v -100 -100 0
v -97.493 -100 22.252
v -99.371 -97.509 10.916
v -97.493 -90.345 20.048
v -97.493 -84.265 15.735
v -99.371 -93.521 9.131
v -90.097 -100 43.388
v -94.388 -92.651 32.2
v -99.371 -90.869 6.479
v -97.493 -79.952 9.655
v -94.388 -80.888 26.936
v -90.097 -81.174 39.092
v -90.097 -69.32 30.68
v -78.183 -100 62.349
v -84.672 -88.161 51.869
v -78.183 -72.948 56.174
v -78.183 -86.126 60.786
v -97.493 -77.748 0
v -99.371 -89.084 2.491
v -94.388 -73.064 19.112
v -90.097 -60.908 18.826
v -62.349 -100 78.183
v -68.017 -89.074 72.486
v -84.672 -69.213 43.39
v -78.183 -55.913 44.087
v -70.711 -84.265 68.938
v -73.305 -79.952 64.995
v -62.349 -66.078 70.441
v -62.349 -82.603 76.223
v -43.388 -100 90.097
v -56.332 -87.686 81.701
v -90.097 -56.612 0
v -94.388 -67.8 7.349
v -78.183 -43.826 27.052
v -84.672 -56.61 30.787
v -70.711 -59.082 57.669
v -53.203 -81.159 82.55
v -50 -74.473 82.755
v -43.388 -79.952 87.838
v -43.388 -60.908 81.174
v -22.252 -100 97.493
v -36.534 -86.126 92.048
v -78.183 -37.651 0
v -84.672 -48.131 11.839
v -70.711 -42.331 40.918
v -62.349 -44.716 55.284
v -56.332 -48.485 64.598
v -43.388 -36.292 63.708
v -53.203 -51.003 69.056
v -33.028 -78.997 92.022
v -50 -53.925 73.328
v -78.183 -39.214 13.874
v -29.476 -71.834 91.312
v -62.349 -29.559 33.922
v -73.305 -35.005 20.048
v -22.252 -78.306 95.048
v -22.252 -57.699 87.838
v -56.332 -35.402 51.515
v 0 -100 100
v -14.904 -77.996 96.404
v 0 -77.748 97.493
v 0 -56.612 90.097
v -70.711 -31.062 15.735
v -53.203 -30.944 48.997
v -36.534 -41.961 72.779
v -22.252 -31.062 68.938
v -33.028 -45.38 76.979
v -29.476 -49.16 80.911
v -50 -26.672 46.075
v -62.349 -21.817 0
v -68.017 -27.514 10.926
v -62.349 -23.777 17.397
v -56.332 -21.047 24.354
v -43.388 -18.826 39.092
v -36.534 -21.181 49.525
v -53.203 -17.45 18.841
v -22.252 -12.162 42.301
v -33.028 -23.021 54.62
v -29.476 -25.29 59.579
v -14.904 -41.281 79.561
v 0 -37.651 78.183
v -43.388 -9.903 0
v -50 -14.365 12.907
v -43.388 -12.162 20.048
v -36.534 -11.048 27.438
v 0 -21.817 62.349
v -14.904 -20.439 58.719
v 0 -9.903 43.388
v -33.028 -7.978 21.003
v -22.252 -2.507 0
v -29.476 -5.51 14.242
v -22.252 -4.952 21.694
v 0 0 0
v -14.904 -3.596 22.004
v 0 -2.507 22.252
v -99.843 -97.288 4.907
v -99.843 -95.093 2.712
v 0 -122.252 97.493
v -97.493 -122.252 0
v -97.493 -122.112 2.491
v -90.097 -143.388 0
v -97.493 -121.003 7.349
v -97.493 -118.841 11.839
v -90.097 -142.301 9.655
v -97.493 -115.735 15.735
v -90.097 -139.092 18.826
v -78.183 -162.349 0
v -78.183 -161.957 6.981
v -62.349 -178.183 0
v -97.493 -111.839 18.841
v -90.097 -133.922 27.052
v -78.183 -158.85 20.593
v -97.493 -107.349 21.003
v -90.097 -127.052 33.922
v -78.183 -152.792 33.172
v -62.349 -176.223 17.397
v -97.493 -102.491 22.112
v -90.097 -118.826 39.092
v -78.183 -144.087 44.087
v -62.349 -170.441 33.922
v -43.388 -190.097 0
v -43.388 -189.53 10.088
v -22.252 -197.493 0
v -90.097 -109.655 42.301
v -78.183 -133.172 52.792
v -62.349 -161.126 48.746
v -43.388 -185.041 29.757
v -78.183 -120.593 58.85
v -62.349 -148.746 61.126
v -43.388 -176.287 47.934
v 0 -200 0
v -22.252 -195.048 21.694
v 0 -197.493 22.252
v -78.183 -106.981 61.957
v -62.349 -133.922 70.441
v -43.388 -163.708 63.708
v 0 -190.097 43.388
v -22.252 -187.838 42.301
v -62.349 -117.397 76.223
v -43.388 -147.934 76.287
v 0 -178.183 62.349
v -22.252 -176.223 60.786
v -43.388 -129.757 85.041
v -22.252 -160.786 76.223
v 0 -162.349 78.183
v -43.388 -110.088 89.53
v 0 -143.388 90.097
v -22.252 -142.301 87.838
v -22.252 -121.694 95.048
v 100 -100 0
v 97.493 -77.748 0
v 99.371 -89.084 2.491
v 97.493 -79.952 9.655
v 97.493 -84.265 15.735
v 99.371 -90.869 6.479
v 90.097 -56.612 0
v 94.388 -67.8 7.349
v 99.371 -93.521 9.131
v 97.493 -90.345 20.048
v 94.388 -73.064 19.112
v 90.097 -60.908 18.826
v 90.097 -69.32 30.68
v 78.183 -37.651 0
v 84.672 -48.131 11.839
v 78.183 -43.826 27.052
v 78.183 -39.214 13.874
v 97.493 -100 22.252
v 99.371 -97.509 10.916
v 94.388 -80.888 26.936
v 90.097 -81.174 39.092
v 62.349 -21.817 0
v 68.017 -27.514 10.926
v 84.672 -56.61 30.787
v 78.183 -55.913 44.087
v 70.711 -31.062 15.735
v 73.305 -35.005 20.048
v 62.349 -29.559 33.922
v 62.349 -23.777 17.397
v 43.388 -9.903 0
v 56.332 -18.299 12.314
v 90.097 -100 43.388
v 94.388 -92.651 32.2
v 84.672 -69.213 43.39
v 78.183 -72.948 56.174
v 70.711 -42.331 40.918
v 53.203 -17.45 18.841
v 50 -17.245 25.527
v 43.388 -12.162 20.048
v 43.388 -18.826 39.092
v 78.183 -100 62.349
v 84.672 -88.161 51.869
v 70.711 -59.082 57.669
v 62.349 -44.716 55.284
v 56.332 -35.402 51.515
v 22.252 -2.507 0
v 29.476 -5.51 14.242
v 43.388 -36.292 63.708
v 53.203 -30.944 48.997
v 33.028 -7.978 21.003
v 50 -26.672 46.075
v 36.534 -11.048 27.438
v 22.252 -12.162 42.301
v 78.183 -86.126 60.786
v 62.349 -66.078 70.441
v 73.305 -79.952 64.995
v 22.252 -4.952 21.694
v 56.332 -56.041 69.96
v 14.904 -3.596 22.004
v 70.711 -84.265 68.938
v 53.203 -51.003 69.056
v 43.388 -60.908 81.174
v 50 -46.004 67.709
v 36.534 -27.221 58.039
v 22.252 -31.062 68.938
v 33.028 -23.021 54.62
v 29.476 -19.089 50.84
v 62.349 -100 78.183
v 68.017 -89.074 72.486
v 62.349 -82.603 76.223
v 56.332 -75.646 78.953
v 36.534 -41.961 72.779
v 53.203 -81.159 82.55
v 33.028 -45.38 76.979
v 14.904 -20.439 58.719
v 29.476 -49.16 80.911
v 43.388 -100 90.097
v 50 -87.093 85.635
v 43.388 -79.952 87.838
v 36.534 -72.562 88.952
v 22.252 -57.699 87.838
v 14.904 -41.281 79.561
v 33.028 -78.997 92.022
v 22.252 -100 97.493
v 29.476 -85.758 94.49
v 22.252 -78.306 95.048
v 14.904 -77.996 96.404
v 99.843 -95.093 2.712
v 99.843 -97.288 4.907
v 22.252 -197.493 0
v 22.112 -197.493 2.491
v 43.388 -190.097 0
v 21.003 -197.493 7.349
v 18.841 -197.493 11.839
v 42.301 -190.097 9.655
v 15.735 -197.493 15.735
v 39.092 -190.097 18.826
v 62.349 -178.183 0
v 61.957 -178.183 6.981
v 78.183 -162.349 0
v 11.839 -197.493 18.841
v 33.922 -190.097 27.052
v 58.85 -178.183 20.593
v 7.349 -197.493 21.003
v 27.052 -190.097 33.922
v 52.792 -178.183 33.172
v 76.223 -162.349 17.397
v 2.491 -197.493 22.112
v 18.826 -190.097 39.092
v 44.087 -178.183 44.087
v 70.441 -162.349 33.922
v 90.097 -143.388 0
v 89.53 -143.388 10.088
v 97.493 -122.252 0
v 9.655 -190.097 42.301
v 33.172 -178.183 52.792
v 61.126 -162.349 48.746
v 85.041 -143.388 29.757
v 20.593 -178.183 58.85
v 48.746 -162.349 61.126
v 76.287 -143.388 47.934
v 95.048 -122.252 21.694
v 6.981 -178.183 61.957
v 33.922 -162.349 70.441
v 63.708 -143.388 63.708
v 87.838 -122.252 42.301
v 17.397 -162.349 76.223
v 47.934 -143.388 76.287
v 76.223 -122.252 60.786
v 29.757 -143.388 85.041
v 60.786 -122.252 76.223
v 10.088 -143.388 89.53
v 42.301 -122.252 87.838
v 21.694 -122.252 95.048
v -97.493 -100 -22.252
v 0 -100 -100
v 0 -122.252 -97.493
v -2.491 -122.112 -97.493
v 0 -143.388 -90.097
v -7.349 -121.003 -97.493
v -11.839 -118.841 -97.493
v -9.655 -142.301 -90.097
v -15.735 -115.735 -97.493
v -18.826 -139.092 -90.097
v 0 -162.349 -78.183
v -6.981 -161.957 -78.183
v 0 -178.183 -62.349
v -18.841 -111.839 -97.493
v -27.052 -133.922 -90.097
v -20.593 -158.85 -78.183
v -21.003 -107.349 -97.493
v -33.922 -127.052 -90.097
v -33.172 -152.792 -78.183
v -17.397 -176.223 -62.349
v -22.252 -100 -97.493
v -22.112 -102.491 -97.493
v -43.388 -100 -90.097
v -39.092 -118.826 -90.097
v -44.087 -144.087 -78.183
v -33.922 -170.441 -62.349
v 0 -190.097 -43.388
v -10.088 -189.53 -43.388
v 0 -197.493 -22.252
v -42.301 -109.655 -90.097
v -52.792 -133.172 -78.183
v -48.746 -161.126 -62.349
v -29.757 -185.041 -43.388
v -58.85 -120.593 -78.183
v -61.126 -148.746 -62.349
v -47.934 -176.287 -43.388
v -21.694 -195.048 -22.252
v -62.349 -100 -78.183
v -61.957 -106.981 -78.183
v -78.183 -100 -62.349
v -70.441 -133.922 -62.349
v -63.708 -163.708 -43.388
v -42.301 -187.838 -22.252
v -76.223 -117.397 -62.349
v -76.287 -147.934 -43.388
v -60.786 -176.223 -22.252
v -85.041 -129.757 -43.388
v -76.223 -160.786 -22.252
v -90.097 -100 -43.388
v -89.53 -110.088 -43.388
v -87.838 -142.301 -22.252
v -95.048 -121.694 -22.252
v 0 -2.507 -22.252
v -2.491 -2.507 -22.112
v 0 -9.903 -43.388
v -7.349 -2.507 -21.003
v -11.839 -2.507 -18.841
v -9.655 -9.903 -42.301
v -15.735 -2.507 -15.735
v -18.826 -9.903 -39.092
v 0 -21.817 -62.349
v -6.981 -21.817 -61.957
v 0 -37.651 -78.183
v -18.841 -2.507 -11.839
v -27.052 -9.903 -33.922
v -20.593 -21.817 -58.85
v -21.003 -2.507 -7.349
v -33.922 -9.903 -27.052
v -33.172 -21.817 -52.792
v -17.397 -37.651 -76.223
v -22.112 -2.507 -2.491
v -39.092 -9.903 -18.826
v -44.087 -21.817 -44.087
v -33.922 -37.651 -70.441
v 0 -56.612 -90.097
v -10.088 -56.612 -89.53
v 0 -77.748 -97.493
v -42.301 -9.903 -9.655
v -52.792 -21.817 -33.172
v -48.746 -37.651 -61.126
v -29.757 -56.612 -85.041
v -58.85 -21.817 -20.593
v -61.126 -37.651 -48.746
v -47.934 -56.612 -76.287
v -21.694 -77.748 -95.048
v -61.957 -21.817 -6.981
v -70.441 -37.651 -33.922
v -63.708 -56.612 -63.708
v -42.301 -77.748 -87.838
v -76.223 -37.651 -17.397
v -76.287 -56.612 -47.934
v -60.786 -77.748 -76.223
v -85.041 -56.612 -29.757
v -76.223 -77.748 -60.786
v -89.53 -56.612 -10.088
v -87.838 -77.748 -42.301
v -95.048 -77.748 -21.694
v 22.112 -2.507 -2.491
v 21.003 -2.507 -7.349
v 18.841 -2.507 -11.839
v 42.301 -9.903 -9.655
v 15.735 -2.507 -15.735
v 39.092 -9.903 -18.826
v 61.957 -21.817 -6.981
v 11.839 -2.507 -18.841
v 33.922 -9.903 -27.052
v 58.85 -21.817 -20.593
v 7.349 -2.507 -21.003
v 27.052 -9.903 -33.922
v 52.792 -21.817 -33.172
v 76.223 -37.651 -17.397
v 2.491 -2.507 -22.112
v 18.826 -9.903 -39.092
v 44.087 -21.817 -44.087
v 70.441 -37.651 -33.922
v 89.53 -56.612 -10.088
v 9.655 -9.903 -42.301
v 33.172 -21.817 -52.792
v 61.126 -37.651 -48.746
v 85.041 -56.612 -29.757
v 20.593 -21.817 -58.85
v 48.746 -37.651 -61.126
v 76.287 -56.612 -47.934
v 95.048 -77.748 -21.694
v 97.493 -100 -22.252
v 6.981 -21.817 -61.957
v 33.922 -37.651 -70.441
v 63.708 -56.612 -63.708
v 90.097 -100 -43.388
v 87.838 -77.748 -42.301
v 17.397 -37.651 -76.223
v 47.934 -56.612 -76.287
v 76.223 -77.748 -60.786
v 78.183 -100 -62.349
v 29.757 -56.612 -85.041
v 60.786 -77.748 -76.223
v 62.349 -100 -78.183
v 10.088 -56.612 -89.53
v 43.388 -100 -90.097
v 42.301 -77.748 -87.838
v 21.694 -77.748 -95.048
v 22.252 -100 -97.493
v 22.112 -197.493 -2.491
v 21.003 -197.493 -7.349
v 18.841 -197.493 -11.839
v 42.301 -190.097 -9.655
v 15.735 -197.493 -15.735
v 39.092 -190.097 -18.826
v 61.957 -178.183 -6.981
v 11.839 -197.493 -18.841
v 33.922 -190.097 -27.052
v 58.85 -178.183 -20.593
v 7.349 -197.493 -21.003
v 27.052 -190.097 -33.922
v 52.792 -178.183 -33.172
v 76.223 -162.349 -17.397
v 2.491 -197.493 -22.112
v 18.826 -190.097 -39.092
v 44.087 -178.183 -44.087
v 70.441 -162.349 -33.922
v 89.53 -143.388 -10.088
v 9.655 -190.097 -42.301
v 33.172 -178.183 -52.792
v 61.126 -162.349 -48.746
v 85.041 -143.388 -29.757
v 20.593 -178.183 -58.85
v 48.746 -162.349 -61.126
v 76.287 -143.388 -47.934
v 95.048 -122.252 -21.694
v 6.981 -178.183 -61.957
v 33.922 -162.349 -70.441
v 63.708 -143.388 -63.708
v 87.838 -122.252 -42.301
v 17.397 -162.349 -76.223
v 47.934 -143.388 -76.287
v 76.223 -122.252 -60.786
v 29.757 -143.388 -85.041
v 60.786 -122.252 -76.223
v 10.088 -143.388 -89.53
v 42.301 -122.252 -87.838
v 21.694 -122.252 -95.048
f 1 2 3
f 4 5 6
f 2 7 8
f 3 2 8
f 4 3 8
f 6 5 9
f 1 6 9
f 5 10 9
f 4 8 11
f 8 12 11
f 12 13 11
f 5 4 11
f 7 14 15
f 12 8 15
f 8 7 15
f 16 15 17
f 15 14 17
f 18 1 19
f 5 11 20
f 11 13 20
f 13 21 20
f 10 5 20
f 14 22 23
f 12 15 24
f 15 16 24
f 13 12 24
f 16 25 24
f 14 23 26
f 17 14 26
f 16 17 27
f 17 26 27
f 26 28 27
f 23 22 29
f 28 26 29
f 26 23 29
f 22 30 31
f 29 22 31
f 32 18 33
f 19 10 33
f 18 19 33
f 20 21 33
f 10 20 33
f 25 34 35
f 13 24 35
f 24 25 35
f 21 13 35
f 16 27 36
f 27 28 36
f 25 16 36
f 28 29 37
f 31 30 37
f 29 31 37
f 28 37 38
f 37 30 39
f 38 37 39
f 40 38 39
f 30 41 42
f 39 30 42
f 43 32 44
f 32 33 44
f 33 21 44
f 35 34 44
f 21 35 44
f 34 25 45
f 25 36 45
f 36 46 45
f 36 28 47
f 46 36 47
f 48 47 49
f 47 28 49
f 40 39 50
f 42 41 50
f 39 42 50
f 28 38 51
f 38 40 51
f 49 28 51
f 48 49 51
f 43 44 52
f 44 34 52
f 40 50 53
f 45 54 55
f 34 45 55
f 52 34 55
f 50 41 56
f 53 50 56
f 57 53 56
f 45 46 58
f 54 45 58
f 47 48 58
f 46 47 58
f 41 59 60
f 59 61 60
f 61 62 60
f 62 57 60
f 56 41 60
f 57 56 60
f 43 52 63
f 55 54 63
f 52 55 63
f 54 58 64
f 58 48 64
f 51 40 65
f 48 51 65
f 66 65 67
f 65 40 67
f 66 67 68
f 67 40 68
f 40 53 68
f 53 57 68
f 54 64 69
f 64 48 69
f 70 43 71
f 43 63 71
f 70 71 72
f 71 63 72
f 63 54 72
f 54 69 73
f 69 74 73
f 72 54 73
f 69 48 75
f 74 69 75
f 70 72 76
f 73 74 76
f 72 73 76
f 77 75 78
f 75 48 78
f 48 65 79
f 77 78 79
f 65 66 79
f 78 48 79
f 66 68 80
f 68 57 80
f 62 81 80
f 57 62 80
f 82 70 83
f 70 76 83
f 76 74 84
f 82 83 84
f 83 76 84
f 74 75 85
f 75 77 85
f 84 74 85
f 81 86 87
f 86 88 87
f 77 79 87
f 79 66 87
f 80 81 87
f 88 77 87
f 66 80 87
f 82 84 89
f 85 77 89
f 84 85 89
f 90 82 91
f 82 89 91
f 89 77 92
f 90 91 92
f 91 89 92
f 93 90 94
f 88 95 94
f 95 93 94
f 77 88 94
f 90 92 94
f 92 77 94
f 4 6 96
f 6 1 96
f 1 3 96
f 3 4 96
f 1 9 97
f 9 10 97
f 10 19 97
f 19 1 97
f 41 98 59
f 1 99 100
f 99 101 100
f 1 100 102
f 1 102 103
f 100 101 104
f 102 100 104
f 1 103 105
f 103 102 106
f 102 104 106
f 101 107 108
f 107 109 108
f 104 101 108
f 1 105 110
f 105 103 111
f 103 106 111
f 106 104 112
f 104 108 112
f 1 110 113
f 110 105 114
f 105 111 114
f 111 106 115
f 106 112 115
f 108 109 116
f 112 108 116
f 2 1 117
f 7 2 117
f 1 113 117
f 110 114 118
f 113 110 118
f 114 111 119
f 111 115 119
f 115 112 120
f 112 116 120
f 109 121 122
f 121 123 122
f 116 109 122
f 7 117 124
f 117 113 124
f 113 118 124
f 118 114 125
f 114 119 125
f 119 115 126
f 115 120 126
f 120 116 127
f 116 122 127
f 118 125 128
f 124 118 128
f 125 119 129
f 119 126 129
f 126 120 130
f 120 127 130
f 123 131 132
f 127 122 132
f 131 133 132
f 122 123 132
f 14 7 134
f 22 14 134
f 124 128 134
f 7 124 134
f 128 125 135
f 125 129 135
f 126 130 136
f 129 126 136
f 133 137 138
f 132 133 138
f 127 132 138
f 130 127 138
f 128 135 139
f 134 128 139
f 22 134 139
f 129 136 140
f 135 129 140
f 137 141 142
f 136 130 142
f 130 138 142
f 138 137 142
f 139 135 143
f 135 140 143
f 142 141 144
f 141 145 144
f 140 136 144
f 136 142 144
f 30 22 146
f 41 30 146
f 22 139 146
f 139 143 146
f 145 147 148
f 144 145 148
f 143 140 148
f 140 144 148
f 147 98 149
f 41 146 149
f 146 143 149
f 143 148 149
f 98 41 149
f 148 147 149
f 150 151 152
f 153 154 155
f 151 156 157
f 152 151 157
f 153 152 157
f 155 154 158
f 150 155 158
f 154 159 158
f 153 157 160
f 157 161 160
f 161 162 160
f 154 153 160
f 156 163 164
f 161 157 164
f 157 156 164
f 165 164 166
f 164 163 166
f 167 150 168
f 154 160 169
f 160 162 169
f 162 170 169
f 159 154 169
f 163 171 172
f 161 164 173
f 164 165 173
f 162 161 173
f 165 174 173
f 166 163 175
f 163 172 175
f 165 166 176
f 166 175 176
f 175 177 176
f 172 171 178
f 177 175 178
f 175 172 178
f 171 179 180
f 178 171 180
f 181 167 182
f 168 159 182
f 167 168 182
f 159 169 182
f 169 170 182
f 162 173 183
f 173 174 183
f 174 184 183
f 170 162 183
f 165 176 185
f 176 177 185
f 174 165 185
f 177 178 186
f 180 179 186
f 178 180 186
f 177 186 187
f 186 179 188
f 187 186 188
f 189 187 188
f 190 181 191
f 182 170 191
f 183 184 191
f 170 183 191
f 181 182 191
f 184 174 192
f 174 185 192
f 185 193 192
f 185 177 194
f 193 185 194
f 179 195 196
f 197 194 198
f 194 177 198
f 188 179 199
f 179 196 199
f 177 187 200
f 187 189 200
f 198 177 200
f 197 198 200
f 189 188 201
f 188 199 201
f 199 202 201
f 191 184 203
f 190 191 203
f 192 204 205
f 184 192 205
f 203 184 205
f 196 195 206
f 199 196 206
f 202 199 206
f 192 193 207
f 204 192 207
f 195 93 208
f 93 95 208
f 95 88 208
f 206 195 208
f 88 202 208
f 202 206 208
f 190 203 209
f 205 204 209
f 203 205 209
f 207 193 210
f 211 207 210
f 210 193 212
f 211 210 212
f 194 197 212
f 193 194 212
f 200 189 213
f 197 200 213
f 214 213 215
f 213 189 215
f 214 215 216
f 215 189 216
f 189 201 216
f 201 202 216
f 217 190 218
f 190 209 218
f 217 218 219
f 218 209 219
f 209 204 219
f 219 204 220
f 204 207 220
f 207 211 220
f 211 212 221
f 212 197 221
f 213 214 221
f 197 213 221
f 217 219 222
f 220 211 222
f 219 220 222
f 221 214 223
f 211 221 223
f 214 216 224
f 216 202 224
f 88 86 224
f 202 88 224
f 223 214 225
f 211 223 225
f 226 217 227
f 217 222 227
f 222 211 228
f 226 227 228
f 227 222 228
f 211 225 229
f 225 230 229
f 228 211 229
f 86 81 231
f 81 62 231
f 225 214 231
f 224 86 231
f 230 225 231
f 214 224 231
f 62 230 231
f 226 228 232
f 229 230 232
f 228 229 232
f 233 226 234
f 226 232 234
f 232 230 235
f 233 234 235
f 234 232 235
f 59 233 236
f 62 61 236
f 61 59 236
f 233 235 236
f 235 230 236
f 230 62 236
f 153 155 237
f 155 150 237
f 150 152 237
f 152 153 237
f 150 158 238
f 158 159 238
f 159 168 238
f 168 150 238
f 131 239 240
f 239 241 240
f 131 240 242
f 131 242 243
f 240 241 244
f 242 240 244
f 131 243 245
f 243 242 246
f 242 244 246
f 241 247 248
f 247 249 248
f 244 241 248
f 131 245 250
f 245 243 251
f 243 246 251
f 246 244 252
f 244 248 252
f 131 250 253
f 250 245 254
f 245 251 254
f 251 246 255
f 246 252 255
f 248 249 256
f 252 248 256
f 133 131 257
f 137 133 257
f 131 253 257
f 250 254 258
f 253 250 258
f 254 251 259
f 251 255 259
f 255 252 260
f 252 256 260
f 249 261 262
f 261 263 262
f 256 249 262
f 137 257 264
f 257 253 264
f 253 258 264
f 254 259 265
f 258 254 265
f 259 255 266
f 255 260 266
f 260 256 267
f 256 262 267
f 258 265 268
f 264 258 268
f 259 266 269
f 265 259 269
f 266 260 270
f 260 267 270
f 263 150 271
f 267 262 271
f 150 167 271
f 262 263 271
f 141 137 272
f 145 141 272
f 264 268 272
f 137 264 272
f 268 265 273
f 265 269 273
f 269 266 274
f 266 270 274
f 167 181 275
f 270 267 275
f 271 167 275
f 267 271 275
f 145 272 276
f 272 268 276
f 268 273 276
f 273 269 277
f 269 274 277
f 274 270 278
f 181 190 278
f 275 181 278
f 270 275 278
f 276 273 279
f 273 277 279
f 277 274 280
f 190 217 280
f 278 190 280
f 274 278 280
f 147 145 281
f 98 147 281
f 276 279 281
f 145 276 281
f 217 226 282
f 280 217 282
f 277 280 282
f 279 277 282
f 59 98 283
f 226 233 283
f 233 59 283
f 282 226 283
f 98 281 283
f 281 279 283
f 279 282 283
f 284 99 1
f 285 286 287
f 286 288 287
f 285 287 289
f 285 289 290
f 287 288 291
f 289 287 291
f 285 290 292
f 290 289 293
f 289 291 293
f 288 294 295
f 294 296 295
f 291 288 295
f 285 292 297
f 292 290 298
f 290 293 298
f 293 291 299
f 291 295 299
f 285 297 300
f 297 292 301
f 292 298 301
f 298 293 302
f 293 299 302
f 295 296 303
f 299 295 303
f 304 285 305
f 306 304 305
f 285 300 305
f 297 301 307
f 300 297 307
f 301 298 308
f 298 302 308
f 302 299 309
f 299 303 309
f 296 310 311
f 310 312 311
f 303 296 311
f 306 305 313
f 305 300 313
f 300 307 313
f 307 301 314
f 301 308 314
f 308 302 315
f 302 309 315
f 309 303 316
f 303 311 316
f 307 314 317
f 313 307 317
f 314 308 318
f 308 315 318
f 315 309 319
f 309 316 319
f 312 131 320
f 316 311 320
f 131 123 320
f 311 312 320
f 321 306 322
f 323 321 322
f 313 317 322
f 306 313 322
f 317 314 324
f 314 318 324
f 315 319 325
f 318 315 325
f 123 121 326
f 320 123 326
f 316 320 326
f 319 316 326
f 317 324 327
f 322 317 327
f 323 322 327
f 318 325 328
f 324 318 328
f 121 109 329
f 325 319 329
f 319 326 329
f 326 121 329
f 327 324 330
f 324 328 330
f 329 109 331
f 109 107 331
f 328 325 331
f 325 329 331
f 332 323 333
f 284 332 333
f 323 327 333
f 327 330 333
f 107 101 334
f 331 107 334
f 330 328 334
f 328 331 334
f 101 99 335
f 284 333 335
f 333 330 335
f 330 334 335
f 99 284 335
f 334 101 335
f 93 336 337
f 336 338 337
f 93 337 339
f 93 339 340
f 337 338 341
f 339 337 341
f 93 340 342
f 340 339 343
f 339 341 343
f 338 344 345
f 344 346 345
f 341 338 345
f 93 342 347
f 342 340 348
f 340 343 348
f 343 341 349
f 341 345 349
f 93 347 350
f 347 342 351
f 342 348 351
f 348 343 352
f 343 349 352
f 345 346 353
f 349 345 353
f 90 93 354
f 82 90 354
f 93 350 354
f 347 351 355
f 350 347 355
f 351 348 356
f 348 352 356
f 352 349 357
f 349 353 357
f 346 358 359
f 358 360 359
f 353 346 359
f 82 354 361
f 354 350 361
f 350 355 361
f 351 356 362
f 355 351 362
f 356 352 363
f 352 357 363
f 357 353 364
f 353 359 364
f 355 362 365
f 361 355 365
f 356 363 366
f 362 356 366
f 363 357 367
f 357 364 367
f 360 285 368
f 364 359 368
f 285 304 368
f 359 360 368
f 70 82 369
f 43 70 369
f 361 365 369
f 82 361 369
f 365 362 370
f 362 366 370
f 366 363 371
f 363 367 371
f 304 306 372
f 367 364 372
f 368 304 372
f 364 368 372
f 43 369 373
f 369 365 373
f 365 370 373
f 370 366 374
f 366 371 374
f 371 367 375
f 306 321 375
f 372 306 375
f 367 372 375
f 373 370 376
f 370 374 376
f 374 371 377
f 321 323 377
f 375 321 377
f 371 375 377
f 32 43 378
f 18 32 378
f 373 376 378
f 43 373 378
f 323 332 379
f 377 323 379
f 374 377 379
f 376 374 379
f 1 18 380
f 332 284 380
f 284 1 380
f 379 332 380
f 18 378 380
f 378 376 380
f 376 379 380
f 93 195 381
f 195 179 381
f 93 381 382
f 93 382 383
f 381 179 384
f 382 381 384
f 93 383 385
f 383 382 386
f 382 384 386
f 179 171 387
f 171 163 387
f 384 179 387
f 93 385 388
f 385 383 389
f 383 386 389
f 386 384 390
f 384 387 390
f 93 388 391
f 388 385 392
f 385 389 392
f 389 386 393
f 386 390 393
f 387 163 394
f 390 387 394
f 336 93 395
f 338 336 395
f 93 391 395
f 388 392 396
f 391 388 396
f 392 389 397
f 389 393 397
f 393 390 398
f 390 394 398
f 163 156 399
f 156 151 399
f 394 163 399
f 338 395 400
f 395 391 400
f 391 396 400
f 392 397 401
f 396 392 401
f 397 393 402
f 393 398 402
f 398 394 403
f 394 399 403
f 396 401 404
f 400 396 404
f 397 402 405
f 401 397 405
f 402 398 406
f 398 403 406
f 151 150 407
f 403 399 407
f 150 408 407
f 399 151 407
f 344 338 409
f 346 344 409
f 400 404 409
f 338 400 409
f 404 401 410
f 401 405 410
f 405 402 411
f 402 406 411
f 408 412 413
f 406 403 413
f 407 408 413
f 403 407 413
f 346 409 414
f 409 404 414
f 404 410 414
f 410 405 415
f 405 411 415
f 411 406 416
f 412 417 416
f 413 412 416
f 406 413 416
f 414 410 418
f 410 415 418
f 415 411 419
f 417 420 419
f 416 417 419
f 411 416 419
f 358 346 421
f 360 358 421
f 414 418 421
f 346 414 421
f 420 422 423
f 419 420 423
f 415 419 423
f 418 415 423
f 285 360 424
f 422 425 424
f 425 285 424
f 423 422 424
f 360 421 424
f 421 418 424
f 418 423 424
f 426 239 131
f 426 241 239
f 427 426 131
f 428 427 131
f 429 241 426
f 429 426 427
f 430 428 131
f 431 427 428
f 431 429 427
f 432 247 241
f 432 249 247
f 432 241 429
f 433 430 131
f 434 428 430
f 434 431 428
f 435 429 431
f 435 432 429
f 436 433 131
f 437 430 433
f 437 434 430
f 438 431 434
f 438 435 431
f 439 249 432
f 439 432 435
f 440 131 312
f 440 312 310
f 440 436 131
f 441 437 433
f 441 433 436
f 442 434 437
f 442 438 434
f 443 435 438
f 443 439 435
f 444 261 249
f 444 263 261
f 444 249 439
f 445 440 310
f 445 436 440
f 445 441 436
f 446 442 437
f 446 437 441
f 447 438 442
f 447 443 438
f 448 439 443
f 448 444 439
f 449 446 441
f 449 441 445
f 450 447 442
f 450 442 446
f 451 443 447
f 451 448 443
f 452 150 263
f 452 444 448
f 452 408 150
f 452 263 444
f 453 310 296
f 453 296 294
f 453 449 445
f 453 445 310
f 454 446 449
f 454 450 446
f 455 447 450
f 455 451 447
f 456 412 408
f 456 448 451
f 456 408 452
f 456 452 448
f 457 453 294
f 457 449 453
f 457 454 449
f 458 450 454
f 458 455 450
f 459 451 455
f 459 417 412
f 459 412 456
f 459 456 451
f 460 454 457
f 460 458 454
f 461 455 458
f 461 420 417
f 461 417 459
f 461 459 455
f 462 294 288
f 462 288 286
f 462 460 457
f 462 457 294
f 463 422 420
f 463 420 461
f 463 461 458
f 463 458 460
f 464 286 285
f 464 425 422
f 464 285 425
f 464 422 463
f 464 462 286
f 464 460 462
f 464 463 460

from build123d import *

# Parameters (mm, degrees)
F0_W        = 200
F0_H        = 200
F1_DEPTH    = 200
F2_R        = 99.99999
F3_T1_DEPTH = 200
F3_T4_ANGLE = 90
F3_T6_ANGLE = 90


# Not quite as in the source:
# - a fillet or chamfer that OpenCascade refuses, or shapes differently, is made with other operations: its cross-section is extruded or revolved along the edge and cut away or added
# - a fillet or chamfer is up to 0.001 mm smaller than in the source, because OpenCascade refuses the exact size


with BuildPart() as f1:
    # F0 (on Front) → F1 (new body)
    with BuildSketch(Plane.XZ):
        Rectangle(F0_W, F0_H)
    extrude(amount=F1_DEPTH)

    # F2 (radius 100 in the source; OpenCascade refuses exactly that, so slightly less here)
    f2_edges = [f1.edges().sort_by_distance(p)[0] for p in [
        (100, -100, -100),
        (100, -100, 100),
        (100, 0, 0),
        (100, -200, 0),
        (0, -200, 100),
        (-100, -200, 0),
        (0, -200, -100),
        (-100, -100, -100),
        (0, 0, -100),
        (-100, -100, 100),
        (-100, 0, 0),
    ]]
    fillet(f2_edges, radius=F2_R)

    # F3: fillet of radius 100 on 1 edges, made by hand

    # F3_s2 → F3_t1 (cut)
    with BuildSketch(Plane.YZ.offset(-100)):
        with BuildLine():
            ThreePointArc((0, 0), (-29.2893218813, 70.7106781187), (-100, 100))
            Line((-100, 100), (0, 100))
            Line((0, 100), (0, 0))
        make_face()
    extrude(amount=F3_T1_DEPTH, mode=Mode.SUBTRACT)

    # F3_s3 → F3_t4 (revolve, cut)
    with BuildSketch(Plane.XY):
        with BuildLine():
            ThreePointArc((100, -99.99999), (70.7106810476, -29.2893189524), (1e-05, 0))
            Line((1e-05, 0), (100, 0))
            Line((100, 0), (100, -99.99999))
        make_face()
    revolve(axis=Axis((100, -100, 0), (1, 0, 0)), revolution_arc=F3_T4_ANGLE, mode=Mode.SUBTRACT)

    # F3_s5 → F3_t6 (revolve, cut)
    with BuildSketch(Plane.XZ.offset(100)):
        with BuildLine():
            ThreePointArc((-100, 1e-05), (-70.7106810476, 70.7106810476), (-1e-05, 100))
            Line((-1e-05, 100), (-100, 100))
            Line((-100, 100), (-100, 1e-05))
        make_face()
    revolve(axis=Axis((-100, -100, 0), (-1, 0, 0)), revolution_arc=F3_T6_ANGLE, mode=Mode.SUBTRACT)


solid = f1.part
